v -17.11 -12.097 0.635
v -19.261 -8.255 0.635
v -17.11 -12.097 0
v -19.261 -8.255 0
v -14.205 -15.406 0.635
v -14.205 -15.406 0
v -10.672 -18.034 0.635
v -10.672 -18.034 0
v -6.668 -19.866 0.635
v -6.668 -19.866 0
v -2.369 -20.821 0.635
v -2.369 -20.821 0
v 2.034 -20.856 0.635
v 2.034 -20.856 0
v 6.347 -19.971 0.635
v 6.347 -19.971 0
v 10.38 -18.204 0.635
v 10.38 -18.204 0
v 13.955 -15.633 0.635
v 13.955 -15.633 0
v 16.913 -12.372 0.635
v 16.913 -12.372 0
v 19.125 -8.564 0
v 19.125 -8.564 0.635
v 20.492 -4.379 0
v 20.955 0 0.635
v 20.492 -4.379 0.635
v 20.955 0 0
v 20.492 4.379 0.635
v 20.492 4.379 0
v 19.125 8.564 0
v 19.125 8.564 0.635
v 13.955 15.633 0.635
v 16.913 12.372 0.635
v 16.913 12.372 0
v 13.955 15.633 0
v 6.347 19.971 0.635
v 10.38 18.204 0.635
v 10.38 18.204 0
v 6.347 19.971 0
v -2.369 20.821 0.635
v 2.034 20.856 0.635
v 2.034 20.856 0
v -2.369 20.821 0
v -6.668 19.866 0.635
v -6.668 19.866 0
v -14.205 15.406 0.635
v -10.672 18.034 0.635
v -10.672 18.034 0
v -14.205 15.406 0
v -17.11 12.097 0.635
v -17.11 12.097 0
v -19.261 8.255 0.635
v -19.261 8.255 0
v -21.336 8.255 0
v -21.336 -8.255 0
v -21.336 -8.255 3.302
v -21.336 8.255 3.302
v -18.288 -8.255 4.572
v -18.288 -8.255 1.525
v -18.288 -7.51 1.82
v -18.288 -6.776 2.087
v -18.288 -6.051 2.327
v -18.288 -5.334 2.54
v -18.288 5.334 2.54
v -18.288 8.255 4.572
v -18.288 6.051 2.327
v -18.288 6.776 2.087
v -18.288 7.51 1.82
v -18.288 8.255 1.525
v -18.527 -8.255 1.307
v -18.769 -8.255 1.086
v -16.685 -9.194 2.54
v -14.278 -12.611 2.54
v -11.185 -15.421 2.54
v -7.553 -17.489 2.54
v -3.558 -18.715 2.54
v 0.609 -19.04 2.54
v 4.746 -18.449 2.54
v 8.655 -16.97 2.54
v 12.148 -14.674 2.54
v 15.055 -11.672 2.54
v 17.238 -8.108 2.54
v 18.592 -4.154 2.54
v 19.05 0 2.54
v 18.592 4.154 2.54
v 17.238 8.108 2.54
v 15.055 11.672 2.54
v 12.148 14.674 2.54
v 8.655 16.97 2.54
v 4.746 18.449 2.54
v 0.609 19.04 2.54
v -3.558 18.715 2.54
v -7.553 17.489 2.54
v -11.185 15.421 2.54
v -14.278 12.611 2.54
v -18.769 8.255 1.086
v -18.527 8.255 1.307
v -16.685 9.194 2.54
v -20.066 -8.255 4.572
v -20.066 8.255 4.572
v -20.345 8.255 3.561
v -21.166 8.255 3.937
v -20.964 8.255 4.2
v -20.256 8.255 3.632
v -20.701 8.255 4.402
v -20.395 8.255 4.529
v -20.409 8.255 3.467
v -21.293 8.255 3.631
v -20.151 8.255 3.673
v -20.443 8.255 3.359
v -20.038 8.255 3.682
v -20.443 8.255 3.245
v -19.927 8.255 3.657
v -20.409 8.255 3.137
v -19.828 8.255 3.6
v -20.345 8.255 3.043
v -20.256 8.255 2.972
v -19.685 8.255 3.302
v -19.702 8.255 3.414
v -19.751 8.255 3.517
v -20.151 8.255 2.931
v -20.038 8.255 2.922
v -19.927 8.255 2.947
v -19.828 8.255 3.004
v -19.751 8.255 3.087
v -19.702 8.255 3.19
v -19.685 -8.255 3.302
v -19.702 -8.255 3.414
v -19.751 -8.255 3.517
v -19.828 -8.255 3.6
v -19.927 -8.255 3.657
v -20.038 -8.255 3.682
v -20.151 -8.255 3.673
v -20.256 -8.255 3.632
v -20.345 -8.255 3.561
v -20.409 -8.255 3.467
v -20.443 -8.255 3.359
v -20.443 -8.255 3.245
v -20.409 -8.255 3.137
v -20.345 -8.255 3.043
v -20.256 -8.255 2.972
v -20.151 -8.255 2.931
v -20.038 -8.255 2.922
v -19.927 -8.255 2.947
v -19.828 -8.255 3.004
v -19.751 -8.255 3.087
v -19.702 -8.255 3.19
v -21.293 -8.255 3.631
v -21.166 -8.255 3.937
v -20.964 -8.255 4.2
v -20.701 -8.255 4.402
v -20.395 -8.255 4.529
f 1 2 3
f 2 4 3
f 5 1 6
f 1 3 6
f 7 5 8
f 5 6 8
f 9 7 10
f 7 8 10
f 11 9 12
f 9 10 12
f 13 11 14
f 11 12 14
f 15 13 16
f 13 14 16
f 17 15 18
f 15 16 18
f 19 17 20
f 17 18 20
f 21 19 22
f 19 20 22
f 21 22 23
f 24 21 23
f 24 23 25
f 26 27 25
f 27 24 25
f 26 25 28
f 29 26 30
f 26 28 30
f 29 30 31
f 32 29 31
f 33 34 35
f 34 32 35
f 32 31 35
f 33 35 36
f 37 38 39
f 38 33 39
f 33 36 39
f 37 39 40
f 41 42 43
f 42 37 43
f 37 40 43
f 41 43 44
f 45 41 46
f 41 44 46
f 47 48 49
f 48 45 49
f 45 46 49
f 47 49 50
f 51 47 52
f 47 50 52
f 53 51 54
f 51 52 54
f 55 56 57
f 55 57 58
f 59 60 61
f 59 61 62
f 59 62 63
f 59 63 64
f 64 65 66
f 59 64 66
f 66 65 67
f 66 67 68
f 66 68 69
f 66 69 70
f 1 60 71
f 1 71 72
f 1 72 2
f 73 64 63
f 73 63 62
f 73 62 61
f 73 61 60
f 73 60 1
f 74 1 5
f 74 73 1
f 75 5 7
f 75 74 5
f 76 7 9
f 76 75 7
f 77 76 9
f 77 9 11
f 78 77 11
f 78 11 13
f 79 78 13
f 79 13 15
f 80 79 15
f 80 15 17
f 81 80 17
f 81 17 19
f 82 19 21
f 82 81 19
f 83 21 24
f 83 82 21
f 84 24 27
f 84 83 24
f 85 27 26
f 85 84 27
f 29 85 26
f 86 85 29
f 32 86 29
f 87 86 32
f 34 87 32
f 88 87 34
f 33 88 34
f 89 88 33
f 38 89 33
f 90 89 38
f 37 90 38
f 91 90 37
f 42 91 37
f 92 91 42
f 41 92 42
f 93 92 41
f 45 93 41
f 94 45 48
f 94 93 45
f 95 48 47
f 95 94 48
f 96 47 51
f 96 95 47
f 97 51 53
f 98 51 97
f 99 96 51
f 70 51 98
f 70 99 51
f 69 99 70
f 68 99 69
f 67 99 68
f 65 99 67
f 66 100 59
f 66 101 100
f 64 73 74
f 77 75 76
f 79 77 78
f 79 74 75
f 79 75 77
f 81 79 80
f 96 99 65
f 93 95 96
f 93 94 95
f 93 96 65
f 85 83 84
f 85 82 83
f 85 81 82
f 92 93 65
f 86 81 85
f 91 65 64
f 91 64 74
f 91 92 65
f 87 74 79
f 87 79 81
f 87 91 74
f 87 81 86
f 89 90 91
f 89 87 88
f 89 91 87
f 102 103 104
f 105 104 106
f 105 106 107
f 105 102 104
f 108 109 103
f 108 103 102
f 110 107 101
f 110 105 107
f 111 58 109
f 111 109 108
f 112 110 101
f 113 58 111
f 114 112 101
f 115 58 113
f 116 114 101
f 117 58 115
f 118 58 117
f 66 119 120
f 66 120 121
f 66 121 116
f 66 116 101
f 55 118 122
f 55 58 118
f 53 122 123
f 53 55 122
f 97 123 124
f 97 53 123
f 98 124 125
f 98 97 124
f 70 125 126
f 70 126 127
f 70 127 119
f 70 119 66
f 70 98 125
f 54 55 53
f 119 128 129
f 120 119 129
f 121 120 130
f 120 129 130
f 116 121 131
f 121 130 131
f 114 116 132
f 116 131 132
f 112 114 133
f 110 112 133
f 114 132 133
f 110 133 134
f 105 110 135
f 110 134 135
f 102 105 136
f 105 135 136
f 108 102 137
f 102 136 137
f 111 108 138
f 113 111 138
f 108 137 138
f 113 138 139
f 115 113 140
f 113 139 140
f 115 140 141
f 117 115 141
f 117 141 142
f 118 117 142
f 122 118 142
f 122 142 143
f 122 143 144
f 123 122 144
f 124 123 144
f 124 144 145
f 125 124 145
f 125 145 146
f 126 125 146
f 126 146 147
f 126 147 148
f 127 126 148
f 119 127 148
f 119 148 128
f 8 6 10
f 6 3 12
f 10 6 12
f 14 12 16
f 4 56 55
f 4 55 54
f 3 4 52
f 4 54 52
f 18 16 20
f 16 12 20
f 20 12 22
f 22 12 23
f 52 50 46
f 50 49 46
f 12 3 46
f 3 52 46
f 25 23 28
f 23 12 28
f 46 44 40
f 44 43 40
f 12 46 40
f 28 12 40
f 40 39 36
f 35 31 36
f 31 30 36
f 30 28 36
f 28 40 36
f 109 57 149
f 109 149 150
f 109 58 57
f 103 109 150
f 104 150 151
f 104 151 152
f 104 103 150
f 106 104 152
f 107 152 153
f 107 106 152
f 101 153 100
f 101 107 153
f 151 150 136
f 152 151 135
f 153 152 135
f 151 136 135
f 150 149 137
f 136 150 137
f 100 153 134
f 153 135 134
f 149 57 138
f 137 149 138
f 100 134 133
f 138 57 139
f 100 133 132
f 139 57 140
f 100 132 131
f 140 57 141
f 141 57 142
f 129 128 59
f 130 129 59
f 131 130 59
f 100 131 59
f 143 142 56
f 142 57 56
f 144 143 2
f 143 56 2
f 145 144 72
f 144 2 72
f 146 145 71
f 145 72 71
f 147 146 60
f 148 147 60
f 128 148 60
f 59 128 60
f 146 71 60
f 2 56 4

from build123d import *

# Parameters (mm, degrees)
F0_R     = 20.955
F1_DEPTH = 2.54
F2_SIZE  = 1.905
F3_W     = 3.048
F3_H     = 16.51
F4_DEPTH = 4.572
F5_R     = 1.27
F6_R     = 0.381
F7_DEPTH = 25.4


with BuildPart() as f1:
    # F0 (on Top) → F1 (new body)
    with BuildSketch(Plane.XY):
        Circle(F0_R)
    extrude(amount=F1_DEPTH)

    # F2
    f2_edges = [f1.edges().sort_by_distance(p)[0] for p in [
        (-20.955, 0, 2.54),
    ]]
    chamfer(f2_edges, length=F2_SIZE)

    # F3 (on Top) → F4 (join)
    with BuildSketch(Plane.XY):
        with Locations((-19.812, 0)):
            Rectangle(F3_W, F3_H)
    extrude(amount=F4_DEPTH)

    # F5
    f5_edges = [f1.edges().sort_by_distance(p)[0] for p in [
        (-21.336, 0, 4.572),
    ]]
    fillet(f5_edges, radius=F5_R)

    # F6 (on face) → F7 (cut)
    with BuildSketch(Plane.XZ.offset(8.255)):
        with Locations((-20.066, 3.302)):
            Circle(F6_R)
    extrude(amount=-F7_DEPTH, mode=Mode.SUBTRACT)


solid = f1.part
